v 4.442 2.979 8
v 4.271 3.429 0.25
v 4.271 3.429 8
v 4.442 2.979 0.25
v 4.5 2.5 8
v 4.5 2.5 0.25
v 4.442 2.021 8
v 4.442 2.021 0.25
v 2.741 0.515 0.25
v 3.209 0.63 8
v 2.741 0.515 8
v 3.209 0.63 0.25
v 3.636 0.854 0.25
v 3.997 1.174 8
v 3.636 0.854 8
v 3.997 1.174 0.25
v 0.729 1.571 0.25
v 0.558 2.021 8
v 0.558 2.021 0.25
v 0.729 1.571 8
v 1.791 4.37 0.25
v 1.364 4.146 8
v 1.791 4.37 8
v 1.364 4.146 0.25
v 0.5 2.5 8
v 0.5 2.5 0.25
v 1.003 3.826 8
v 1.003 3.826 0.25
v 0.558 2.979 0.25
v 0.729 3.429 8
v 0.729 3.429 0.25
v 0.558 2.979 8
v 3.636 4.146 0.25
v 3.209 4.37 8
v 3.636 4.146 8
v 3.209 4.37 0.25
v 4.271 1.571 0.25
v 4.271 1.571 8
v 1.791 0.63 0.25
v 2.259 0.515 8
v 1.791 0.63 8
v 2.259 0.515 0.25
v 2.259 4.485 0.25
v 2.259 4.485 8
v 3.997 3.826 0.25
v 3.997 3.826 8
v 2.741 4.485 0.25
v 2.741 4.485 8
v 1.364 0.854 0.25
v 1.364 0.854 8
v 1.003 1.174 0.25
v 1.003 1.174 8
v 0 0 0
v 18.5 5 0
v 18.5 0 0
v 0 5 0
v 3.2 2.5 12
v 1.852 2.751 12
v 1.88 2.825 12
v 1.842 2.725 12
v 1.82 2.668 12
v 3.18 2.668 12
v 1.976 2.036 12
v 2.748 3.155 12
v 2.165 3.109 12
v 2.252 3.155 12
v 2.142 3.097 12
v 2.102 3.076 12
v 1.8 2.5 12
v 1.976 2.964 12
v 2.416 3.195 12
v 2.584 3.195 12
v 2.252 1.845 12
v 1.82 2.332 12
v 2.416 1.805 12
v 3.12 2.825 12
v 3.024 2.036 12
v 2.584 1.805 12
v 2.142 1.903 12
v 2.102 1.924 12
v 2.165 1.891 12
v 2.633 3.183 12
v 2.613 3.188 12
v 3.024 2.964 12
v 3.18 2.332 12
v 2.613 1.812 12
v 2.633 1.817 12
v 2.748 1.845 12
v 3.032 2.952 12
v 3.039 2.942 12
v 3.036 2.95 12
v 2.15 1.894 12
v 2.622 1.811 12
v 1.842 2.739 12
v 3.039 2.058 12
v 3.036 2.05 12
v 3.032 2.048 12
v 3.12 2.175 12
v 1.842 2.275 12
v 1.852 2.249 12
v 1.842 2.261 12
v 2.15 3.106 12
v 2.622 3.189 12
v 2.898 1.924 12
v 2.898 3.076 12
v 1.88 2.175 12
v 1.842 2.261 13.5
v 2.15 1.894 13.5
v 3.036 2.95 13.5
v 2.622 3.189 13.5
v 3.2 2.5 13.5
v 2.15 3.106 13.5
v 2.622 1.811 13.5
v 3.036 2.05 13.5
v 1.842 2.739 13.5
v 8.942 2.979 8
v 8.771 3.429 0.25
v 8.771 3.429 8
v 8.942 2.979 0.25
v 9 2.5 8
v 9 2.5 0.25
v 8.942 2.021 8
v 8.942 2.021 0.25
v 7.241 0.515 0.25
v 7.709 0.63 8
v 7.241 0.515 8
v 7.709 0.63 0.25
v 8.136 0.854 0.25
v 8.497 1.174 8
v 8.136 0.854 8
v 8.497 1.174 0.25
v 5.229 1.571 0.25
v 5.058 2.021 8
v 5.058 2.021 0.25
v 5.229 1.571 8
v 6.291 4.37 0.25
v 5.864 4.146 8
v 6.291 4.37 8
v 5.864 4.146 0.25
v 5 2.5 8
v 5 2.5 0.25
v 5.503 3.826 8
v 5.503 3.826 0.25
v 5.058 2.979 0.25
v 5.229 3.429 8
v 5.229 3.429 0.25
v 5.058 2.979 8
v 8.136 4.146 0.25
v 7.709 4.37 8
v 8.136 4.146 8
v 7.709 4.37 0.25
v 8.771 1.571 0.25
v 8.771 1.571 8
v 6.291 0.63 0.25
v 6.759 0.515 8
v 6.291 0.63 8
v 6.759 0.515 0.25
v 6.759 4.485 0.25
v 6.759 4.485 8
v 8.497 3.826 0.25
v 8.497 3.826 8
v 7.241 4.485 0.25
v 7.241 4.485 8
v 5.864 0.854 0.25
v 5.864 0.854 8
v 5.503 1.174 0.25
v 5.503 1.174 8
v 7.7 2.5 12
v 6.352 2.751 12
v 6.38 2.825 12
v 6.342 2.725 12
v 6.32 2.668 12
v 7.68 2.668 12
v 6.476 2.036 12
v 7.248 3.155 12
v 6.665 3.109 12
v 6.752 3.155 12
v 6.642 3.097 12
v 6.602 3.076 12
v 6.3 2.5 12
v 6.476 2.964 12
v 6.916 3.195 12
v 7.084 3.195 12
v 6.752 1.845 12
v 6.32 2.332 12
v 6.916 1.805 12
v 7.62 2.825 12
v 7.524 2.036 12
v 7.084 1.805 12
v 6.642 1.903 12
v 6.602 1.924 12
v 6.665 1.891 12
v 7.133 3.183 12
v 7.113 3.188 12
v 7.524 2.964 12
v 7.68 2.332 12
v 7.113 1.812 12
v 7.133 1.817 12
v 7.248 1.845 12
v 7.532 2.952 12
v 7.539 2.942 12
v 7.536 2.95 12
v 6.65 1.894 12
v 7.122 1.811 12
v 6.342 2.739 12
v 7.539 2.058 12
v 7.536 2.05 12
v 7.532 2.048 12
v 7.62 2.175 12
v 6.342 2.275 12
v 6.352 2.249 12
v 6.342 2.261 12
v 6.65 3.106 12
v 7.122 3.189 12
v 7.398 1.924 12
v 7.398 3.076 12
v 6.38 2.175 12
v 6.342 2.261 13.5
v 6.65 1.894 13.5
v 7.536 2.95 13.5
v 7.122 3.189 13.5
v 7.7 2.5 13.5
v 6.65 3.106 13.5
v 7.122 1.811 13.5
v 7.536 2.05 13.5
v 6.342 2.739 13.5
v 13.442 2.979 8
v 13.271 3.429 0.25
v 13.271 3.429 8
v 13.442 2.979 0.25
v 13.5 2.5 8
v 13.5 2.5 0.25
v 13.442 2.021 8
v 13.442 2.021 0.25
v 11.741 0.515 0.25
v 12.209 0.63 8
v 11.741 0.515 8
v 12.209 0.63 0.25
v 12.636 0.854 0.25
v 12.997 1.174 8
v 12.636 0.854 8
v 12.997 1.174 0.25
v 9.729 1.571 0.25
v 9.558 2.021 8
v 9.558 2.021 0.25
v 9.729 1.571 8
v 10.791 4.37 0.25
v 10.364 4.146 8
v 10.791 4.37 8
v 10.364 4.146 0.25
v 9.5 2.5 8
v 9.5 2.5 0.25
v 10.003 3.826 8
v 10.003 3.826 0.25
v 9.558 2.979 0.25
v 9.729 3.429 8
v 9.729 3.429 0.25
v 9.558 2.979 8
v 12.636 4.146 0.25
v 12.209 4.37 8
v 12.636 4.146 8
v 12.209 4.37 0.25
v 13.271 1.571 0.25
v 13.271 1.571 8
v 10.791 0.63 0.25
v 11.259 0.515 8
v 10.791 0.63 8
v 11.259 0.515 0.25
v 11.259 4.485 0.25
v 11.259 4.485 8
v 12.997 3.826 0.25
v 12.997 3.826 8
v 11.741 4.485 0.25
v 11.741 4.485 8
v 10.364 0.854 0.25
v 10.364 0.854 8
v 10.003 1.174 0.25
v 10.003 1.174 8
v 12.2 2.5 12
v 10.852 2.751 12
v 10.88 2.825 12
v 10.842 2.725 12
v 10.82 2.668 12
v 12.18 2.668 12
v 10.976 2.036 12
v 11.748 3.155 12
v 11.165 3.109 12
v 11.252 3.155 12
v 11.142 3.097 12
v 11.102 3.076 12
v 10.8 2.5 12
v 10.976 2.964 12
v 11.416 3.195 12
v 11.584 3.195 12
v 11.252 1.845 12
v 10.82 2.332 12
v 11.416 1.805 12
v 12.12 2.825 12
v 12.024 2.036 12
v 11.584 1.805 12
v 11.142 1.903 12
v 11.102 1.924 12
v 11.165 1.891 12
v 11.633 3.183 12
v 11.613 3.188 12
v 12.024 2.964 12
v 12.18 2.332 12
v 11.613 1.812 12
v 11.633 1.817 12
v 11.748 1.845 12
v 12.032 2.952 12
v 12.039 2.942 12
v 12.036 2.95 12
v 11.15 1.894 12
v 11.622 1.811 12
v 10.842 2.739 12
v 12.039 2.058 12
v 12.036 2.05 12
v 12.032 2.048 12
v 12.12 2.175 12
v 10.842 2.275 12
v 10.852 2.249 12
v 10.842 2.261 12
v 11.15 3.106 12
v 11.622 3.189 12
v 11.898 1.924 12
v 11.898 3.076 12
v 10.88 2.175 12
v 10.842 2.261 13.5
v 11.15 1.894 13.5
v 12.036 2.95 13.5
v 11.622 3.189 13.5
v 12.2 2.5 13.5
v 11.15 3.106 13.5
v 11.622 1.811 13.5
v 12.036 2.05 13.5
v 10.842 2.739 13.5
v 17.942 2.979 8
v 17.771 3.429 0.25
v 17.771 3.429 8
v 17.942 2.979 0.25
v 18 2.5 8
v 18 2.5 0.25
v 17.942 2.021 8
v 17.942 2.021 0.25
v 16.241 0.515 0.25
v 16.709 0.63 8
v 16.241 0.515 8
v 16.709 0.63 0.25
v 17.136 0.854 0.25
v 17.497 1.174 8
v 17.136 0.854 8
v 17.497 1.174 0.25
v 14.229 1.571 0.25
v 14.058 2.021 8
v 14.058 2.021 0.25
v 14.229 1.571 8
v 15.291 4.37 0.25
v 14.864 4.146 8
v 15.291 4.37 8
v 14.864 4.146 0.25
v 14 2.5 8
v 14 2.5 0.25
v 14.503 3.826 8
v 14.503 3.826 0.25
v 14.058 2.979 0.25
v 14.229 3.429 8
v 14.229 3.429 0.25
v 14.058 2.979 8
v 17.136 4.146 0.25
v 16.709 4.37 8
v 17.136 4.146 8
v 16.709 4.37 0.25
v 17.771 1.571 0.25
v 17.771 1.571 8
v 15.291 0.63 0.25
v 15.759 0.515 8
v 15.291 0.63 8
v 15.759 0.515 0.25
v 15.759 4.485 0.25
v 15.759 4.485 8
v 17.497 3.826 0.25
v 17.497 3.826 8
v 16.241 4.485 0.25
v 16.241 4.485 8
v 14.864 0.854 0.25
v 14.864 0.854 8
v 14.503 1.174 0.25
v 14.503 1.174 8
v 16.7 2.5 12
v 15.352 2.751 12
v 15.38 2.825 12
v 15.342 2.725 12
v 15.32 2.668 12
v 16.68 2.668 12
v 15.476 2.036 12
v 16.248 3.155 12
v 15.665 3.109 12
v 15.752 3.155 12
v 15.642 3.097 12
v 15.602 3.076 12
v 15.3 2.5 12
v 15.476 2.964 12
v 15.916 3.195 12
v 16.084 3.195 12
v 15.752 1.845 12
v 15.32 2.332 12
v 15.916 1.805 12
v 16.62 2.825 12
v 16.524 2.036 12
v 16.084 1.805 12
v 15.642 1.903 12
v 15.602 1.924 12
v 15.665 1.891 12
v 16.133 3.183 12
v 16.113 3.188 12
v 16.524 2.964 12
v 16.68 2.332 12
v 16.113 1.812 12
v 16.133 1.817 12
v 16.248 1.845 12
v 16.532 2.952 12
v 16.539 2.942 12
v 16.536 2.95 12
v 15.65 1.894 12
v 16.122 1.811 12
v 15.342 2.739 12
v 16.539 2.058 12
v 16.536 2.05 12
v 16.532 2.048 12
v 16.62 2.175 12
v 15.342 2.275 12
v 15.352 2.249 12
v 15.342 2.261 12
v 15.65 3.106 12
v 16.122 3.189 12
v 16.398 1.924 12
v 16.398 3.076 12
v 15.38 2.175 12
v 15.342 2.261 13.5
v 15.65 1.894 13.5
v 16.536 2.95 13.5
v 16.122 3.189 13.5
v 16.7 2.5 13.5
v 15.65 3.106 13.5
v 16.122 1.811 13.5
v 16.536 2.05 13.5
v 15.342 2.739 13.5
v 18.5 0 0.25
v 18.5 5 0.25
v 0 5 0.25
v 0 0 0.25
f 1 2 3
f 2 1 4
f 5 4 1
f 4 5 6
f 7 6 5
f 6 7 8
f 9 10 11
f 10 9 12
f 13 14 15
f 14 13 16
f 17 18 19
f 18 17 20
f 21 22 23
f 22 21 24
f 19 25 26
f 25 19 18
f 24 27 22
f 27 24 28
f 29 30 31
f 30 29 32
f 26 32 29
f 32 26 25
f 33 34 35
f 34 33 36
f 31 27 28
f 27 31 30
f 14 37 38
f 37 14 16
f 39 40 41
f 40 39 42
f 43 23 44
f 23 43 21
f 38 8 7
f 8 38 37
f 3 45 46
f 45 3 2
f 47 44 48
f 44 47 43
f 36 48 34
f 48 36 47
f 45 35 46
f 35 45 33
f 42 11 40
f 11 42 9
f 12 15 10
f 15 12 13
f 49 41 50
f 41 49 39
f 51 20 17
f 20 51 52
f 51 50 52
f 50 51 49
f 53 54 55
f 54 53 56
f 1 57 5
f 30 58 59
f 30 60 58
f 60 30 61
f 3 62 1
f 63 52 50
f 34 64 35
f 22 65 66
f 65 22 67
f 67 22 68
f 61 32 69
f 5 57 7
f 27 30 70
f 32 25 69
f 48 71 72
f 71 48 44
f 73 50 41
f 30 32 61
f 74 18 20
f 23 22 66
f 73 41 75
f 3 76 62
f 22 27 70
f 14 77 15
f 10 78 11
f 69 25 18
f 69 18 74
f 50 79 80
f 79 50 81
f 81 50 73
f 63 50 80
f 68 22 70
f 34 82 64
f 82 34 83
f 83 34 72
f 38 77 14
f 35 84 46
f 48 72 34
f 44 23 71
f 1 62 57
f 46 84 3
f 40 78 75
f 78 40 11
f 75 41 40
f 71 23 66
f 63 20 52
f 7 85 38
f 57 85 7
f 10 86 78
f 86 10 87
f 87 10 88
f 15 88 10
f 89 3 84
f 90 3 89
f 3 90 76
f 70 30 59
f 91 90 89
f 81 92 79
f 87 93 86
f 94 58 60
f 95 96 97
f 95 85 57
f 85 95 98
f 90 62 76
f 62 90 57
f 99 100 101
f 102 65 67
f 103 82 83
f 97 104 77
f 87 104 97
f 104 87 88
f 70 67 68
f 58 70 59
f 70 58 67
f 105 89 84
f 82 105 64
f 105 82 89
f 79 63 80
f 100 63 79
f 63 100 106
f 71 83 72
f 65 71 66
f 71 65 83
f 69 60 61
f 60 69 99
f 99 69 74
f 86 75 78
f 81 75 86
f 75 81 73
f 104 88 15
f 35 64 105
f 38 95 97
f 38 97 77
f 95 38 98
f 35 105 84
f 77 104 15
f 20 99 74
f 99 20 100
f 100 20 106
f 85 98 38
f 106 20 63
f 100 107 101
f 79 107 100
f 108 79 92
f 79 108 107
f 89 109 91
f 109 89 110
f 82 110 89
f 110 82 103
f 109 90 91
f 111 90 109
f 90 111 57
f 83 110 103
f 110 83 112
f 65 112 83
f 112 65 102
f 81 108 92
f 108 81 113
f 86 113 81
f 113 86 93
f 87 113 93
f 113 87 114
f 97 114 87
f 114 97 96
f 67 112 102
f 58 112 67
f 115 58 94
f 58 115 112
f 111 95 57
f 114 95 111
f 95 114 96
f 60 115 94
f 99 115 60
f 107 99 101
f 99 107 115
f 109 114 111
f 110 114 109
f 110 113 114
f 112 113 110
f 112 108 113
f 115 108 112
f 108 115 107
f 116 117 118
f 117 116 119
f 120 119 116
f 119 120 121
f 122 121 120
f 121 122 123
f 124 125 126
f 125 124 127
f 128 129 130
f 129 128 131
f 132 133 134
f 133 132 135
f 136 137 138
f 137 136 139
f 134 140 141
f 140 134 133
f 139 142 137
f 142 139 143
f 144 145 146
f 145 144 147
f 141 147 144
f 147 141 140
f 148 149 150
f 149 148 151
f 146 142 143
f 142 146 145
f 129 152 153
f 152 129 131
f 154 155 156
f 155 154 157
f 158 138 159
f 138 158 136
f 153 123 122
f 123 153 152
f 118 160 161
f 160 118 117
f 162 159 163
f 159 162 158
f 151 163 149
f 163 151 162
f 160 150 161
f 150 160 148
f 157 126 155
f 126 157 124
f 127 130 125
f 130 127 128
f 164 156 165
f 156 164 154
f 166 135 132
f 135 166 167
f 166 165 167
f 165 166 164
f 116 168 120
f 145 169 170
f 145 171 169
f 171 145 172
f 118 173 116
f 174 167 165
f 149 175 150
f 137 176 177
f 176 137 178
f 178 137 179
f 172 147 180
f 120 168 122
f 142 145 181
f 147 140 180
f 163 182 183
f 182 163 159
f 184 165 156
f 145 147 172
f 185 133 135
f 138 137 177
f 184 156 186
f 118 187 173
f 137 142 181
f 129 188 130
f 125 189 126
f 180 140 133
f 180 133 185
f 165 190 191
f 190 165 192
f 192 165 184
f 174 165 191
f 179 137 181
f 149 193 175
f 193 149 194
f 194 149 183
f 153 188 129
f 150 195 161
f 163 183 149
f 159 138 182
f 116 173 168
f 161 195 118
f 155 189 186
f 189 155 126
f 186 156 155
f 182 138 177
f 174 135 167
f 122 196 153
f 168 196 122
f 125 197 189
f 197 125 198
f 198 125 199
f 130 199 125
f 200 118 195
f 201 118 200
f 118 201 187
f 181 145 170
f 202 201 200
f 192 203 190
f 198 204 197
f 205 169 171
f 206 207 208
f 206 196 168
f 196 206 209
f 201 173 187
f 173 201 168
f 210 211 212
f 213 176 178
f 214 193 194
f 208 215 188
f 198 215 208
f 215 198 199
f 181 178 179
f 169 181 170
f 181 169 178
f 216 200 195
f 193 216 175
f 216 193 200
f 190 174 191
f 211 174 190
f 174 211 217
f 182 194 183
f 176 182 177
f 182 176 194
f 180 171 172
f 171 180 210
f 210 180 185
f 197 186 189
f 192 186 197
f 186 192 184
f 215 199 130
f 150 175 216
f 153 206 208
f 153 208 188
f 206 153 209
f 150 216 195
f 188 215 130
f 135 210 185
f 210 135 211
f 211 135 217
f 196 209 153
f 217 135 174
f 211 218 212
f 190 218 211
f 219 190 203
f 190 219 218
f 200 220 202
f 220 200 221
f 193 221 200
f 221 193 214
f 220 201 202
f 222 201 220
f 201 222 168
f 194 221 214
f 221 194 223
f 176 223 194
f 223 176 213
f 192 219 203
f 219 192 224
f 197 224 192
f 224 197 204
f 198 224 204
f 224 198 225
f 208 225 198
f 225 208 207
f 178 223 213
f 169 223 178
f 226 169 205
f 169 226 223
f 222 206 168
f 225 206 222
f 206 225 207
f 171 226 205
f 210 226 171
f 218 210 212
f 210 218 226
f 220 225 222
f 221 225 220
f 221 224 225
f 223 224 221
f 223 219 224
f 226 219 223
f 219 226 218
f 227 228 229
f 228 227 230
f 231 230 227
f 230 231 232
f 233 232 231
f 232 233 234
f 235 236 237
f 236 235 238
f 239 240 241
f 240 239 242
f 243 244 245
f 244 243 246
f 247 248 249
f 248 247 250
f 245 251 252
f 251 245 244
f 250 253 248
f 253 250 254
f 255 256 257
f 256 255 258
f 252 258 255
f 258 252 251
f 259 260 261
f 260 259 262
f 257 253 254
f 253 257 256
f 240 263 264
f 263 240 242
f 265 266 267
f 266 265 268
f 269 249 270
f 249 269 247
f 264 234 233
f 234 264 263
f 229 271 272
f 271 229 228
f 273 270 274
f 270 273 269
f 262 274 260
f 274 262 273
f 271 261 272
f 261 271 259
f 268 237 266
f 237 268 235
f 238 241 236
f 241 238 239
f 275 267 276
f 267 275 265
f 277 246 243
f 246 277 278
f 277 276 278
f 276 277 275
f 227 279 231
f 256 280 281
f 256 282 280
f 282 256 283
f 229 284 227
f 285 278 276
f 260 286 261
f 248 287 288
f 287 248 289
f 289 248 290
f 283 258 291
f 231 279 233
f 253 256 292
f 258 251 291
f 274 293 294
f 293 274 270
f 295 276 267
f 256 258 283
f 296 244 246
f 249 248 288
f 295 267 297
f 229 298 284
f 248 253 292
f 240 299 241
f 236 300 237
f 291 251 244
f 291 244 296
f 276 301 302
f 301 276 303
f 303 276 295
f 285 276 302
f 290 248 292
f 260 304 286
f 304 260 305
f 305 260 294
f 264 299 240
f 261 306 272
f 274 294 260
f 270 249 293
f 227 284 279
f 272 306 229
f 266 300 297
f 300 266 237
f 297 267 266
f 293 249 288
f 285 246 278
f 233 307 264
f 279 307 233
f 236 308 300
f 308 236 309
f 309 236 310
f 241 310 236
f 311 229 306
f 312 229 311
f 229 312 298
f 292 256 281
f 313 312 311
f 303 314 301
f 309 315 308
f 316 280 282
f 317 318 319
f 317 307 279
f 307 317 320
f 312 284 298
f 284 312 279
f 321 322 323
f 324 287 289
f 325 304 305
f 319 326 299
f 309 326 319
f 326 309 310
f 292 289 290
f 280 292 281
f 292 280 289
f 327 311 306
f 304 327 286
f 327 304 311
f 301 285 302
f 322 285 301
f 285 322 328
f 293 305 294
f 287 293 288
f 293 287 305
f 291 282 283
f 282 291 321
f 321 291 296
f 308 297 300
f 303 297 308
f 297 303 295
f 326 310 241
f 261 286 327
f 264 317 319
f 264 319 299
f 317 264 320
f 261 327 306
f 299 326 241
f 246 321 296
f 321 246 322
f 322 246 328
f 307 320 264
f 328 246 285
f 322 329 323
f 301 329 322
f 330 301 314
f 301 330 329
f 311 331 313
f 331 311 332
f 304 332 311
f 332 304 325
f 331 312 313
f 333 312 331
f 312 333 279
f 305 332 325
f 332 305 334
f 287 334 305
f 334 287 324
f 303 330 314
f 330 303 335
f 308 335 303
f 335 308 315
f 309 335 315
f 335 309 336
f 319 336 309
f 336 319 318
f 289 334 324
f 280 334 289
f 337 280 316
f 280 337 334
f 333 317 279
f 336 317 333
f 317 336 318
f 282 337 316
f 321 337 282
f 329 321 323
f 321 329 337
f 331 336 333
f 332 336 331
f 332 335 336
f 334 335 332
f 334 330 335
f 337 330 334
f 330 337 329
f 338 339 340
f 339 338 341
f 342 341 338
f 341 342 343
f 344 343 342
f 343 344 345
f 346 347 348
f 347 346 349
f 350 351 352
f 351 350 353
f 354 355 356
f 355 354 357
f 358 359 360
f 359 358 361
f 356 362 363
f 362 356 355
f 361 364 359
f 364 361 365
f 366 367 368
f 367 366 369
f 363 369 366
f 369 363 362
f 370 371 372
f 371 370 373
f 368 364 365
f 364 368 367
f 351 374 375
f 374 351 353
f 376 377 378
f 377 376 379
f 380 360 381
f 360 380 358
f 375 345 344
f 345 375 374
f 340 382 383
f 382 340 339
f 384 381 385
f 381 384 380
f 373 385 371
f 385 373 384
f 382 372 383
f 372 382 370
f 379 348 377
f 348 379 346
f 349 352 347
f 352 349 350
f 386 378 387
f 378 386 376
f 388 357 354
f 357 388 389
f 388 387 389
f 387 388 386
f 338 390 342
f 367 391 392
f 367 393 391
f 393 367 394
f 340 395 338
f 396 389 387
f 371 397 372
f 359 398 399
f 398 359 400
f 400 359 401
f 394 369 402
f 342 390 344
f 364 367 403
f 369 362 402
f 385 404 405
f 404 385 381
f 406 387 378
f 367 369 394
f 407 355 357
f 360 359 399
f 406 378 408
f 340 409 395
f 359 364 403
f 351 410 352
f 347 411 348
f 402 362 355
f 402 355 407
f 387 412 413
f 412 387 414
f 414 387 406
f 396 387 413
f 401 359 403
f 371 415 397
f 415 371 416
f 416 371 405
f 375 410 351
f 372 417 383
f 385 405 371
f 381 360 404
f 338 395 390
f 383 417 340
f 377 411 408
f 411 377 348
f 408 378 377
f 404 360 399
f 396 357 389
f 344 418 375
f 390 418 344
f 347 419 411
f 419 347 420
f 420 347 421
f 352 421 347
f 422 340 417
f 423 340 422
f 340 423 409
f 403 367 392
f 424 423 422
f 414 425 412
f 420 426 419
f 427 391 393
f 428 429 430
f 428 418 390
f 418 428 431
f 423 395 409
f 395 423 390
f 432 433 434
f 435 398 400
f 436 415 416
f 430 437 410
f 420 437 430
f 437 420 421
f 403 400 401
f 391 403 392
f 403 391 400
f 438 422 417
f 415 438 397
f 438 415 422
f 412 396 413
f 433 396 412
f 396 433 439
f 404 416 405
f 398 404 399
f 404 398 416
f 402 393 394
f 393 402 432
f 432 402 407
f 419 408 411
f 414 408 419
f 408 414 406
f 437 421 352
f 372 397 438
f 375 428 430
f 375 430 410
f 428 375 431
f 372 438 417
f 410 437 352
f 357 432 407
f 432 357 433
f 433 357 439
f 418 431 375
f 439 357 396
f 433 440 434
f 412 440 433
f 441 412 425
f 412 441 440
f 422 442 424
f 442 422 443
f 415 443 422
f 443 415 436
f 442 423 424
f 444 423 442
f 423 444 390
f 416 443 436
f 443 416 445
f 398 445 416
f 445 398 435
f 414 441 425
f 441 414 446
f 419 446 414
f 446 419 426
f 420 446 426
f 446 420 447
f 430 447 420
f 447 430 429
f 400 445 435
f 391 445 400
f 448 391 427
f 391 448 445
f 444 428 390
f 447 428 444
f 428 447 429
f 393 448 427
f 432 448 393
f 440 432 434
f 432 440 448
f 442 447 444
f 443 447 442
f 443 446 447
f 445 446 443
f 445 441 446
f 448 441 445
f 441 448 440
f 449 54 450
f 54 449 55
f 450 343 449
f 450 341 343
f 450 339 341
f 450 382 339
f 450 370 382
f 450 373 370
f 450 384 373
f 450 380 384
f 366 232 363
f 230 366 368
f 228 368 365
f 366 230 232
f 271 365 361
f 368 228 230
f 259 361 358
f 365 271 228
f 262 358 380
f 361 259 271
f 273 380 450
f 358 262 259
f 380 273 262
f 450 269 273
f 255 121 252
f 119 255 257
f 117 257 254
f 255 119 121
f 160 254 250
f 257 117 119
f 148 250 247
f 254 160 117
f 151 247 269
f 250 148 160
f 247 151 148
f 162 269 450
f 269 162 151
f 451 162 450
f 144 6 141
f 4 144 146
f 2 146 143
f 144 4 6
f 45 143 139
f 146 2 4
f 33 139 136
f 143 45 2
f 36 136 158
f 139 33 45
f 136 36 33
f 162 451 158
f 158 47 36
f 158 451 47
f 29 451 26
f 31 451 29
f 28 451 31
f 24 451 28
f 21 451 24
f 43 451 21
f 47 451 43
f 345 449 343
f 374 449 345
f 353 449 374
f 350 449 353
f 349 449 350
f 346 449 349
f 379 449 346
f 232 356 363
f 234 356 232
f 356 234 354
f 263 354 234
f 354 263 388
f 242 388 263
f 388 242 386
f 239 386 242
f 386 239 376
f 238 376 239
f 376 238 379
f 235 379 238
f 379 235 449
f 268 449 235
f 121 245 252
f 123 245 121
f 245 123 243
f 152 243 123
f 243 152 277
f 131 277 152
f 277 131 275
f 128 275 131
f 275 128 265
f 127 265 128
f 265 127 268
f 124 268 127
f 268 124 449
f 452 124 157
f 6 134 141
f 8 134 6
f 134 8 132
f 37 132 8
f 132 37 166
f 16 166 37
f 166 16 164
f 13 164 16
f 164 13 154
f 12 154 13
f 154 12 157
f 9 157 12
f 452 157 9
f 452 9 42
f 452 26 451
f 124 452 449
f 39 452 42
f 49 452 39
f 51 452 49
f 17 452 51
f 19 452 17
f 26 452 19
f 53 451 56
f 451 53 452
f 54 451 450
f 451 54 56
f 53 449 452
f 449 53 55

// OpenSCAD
bottle_width = 4;
bottle_cnt = 4;
shelf_height=0.25;
bottle_padding=.5;
module bottle() {
    cylinder(r=bottle_width/2, h=8);
    translate( [0,0, 8]) cylinder(r1=2, r2=.7, h=4);
    translate( [0,0, 12]) cylinder(r=.7, h=1.5);
}

module bottle_shelf() {
    shelf_width = bottle_width+1;
    //shelf_length = bottle_cnt*(bottle_width+1);
    shelf_length= bottle_cnt *  (bottle_width+bottle_padding) + bottle_padding;
    
    cube( [shelf_length, shelf_width, shelf_height] );
}

module loaded_shelf() {
    for (i=[0:bottle_cnt-1]) {
        first_offset = bottle_width/2+bottle_padding;
        translate( [i* (bottle_width+bottle_padding) + bottle_width/2 + bottle_padding,    bottle_width/2+bottle_padding, 0]) bottle();
    }
    bottle_shelf();
}

$fa=.5;
$fs=.5;
loaded_shelf();
